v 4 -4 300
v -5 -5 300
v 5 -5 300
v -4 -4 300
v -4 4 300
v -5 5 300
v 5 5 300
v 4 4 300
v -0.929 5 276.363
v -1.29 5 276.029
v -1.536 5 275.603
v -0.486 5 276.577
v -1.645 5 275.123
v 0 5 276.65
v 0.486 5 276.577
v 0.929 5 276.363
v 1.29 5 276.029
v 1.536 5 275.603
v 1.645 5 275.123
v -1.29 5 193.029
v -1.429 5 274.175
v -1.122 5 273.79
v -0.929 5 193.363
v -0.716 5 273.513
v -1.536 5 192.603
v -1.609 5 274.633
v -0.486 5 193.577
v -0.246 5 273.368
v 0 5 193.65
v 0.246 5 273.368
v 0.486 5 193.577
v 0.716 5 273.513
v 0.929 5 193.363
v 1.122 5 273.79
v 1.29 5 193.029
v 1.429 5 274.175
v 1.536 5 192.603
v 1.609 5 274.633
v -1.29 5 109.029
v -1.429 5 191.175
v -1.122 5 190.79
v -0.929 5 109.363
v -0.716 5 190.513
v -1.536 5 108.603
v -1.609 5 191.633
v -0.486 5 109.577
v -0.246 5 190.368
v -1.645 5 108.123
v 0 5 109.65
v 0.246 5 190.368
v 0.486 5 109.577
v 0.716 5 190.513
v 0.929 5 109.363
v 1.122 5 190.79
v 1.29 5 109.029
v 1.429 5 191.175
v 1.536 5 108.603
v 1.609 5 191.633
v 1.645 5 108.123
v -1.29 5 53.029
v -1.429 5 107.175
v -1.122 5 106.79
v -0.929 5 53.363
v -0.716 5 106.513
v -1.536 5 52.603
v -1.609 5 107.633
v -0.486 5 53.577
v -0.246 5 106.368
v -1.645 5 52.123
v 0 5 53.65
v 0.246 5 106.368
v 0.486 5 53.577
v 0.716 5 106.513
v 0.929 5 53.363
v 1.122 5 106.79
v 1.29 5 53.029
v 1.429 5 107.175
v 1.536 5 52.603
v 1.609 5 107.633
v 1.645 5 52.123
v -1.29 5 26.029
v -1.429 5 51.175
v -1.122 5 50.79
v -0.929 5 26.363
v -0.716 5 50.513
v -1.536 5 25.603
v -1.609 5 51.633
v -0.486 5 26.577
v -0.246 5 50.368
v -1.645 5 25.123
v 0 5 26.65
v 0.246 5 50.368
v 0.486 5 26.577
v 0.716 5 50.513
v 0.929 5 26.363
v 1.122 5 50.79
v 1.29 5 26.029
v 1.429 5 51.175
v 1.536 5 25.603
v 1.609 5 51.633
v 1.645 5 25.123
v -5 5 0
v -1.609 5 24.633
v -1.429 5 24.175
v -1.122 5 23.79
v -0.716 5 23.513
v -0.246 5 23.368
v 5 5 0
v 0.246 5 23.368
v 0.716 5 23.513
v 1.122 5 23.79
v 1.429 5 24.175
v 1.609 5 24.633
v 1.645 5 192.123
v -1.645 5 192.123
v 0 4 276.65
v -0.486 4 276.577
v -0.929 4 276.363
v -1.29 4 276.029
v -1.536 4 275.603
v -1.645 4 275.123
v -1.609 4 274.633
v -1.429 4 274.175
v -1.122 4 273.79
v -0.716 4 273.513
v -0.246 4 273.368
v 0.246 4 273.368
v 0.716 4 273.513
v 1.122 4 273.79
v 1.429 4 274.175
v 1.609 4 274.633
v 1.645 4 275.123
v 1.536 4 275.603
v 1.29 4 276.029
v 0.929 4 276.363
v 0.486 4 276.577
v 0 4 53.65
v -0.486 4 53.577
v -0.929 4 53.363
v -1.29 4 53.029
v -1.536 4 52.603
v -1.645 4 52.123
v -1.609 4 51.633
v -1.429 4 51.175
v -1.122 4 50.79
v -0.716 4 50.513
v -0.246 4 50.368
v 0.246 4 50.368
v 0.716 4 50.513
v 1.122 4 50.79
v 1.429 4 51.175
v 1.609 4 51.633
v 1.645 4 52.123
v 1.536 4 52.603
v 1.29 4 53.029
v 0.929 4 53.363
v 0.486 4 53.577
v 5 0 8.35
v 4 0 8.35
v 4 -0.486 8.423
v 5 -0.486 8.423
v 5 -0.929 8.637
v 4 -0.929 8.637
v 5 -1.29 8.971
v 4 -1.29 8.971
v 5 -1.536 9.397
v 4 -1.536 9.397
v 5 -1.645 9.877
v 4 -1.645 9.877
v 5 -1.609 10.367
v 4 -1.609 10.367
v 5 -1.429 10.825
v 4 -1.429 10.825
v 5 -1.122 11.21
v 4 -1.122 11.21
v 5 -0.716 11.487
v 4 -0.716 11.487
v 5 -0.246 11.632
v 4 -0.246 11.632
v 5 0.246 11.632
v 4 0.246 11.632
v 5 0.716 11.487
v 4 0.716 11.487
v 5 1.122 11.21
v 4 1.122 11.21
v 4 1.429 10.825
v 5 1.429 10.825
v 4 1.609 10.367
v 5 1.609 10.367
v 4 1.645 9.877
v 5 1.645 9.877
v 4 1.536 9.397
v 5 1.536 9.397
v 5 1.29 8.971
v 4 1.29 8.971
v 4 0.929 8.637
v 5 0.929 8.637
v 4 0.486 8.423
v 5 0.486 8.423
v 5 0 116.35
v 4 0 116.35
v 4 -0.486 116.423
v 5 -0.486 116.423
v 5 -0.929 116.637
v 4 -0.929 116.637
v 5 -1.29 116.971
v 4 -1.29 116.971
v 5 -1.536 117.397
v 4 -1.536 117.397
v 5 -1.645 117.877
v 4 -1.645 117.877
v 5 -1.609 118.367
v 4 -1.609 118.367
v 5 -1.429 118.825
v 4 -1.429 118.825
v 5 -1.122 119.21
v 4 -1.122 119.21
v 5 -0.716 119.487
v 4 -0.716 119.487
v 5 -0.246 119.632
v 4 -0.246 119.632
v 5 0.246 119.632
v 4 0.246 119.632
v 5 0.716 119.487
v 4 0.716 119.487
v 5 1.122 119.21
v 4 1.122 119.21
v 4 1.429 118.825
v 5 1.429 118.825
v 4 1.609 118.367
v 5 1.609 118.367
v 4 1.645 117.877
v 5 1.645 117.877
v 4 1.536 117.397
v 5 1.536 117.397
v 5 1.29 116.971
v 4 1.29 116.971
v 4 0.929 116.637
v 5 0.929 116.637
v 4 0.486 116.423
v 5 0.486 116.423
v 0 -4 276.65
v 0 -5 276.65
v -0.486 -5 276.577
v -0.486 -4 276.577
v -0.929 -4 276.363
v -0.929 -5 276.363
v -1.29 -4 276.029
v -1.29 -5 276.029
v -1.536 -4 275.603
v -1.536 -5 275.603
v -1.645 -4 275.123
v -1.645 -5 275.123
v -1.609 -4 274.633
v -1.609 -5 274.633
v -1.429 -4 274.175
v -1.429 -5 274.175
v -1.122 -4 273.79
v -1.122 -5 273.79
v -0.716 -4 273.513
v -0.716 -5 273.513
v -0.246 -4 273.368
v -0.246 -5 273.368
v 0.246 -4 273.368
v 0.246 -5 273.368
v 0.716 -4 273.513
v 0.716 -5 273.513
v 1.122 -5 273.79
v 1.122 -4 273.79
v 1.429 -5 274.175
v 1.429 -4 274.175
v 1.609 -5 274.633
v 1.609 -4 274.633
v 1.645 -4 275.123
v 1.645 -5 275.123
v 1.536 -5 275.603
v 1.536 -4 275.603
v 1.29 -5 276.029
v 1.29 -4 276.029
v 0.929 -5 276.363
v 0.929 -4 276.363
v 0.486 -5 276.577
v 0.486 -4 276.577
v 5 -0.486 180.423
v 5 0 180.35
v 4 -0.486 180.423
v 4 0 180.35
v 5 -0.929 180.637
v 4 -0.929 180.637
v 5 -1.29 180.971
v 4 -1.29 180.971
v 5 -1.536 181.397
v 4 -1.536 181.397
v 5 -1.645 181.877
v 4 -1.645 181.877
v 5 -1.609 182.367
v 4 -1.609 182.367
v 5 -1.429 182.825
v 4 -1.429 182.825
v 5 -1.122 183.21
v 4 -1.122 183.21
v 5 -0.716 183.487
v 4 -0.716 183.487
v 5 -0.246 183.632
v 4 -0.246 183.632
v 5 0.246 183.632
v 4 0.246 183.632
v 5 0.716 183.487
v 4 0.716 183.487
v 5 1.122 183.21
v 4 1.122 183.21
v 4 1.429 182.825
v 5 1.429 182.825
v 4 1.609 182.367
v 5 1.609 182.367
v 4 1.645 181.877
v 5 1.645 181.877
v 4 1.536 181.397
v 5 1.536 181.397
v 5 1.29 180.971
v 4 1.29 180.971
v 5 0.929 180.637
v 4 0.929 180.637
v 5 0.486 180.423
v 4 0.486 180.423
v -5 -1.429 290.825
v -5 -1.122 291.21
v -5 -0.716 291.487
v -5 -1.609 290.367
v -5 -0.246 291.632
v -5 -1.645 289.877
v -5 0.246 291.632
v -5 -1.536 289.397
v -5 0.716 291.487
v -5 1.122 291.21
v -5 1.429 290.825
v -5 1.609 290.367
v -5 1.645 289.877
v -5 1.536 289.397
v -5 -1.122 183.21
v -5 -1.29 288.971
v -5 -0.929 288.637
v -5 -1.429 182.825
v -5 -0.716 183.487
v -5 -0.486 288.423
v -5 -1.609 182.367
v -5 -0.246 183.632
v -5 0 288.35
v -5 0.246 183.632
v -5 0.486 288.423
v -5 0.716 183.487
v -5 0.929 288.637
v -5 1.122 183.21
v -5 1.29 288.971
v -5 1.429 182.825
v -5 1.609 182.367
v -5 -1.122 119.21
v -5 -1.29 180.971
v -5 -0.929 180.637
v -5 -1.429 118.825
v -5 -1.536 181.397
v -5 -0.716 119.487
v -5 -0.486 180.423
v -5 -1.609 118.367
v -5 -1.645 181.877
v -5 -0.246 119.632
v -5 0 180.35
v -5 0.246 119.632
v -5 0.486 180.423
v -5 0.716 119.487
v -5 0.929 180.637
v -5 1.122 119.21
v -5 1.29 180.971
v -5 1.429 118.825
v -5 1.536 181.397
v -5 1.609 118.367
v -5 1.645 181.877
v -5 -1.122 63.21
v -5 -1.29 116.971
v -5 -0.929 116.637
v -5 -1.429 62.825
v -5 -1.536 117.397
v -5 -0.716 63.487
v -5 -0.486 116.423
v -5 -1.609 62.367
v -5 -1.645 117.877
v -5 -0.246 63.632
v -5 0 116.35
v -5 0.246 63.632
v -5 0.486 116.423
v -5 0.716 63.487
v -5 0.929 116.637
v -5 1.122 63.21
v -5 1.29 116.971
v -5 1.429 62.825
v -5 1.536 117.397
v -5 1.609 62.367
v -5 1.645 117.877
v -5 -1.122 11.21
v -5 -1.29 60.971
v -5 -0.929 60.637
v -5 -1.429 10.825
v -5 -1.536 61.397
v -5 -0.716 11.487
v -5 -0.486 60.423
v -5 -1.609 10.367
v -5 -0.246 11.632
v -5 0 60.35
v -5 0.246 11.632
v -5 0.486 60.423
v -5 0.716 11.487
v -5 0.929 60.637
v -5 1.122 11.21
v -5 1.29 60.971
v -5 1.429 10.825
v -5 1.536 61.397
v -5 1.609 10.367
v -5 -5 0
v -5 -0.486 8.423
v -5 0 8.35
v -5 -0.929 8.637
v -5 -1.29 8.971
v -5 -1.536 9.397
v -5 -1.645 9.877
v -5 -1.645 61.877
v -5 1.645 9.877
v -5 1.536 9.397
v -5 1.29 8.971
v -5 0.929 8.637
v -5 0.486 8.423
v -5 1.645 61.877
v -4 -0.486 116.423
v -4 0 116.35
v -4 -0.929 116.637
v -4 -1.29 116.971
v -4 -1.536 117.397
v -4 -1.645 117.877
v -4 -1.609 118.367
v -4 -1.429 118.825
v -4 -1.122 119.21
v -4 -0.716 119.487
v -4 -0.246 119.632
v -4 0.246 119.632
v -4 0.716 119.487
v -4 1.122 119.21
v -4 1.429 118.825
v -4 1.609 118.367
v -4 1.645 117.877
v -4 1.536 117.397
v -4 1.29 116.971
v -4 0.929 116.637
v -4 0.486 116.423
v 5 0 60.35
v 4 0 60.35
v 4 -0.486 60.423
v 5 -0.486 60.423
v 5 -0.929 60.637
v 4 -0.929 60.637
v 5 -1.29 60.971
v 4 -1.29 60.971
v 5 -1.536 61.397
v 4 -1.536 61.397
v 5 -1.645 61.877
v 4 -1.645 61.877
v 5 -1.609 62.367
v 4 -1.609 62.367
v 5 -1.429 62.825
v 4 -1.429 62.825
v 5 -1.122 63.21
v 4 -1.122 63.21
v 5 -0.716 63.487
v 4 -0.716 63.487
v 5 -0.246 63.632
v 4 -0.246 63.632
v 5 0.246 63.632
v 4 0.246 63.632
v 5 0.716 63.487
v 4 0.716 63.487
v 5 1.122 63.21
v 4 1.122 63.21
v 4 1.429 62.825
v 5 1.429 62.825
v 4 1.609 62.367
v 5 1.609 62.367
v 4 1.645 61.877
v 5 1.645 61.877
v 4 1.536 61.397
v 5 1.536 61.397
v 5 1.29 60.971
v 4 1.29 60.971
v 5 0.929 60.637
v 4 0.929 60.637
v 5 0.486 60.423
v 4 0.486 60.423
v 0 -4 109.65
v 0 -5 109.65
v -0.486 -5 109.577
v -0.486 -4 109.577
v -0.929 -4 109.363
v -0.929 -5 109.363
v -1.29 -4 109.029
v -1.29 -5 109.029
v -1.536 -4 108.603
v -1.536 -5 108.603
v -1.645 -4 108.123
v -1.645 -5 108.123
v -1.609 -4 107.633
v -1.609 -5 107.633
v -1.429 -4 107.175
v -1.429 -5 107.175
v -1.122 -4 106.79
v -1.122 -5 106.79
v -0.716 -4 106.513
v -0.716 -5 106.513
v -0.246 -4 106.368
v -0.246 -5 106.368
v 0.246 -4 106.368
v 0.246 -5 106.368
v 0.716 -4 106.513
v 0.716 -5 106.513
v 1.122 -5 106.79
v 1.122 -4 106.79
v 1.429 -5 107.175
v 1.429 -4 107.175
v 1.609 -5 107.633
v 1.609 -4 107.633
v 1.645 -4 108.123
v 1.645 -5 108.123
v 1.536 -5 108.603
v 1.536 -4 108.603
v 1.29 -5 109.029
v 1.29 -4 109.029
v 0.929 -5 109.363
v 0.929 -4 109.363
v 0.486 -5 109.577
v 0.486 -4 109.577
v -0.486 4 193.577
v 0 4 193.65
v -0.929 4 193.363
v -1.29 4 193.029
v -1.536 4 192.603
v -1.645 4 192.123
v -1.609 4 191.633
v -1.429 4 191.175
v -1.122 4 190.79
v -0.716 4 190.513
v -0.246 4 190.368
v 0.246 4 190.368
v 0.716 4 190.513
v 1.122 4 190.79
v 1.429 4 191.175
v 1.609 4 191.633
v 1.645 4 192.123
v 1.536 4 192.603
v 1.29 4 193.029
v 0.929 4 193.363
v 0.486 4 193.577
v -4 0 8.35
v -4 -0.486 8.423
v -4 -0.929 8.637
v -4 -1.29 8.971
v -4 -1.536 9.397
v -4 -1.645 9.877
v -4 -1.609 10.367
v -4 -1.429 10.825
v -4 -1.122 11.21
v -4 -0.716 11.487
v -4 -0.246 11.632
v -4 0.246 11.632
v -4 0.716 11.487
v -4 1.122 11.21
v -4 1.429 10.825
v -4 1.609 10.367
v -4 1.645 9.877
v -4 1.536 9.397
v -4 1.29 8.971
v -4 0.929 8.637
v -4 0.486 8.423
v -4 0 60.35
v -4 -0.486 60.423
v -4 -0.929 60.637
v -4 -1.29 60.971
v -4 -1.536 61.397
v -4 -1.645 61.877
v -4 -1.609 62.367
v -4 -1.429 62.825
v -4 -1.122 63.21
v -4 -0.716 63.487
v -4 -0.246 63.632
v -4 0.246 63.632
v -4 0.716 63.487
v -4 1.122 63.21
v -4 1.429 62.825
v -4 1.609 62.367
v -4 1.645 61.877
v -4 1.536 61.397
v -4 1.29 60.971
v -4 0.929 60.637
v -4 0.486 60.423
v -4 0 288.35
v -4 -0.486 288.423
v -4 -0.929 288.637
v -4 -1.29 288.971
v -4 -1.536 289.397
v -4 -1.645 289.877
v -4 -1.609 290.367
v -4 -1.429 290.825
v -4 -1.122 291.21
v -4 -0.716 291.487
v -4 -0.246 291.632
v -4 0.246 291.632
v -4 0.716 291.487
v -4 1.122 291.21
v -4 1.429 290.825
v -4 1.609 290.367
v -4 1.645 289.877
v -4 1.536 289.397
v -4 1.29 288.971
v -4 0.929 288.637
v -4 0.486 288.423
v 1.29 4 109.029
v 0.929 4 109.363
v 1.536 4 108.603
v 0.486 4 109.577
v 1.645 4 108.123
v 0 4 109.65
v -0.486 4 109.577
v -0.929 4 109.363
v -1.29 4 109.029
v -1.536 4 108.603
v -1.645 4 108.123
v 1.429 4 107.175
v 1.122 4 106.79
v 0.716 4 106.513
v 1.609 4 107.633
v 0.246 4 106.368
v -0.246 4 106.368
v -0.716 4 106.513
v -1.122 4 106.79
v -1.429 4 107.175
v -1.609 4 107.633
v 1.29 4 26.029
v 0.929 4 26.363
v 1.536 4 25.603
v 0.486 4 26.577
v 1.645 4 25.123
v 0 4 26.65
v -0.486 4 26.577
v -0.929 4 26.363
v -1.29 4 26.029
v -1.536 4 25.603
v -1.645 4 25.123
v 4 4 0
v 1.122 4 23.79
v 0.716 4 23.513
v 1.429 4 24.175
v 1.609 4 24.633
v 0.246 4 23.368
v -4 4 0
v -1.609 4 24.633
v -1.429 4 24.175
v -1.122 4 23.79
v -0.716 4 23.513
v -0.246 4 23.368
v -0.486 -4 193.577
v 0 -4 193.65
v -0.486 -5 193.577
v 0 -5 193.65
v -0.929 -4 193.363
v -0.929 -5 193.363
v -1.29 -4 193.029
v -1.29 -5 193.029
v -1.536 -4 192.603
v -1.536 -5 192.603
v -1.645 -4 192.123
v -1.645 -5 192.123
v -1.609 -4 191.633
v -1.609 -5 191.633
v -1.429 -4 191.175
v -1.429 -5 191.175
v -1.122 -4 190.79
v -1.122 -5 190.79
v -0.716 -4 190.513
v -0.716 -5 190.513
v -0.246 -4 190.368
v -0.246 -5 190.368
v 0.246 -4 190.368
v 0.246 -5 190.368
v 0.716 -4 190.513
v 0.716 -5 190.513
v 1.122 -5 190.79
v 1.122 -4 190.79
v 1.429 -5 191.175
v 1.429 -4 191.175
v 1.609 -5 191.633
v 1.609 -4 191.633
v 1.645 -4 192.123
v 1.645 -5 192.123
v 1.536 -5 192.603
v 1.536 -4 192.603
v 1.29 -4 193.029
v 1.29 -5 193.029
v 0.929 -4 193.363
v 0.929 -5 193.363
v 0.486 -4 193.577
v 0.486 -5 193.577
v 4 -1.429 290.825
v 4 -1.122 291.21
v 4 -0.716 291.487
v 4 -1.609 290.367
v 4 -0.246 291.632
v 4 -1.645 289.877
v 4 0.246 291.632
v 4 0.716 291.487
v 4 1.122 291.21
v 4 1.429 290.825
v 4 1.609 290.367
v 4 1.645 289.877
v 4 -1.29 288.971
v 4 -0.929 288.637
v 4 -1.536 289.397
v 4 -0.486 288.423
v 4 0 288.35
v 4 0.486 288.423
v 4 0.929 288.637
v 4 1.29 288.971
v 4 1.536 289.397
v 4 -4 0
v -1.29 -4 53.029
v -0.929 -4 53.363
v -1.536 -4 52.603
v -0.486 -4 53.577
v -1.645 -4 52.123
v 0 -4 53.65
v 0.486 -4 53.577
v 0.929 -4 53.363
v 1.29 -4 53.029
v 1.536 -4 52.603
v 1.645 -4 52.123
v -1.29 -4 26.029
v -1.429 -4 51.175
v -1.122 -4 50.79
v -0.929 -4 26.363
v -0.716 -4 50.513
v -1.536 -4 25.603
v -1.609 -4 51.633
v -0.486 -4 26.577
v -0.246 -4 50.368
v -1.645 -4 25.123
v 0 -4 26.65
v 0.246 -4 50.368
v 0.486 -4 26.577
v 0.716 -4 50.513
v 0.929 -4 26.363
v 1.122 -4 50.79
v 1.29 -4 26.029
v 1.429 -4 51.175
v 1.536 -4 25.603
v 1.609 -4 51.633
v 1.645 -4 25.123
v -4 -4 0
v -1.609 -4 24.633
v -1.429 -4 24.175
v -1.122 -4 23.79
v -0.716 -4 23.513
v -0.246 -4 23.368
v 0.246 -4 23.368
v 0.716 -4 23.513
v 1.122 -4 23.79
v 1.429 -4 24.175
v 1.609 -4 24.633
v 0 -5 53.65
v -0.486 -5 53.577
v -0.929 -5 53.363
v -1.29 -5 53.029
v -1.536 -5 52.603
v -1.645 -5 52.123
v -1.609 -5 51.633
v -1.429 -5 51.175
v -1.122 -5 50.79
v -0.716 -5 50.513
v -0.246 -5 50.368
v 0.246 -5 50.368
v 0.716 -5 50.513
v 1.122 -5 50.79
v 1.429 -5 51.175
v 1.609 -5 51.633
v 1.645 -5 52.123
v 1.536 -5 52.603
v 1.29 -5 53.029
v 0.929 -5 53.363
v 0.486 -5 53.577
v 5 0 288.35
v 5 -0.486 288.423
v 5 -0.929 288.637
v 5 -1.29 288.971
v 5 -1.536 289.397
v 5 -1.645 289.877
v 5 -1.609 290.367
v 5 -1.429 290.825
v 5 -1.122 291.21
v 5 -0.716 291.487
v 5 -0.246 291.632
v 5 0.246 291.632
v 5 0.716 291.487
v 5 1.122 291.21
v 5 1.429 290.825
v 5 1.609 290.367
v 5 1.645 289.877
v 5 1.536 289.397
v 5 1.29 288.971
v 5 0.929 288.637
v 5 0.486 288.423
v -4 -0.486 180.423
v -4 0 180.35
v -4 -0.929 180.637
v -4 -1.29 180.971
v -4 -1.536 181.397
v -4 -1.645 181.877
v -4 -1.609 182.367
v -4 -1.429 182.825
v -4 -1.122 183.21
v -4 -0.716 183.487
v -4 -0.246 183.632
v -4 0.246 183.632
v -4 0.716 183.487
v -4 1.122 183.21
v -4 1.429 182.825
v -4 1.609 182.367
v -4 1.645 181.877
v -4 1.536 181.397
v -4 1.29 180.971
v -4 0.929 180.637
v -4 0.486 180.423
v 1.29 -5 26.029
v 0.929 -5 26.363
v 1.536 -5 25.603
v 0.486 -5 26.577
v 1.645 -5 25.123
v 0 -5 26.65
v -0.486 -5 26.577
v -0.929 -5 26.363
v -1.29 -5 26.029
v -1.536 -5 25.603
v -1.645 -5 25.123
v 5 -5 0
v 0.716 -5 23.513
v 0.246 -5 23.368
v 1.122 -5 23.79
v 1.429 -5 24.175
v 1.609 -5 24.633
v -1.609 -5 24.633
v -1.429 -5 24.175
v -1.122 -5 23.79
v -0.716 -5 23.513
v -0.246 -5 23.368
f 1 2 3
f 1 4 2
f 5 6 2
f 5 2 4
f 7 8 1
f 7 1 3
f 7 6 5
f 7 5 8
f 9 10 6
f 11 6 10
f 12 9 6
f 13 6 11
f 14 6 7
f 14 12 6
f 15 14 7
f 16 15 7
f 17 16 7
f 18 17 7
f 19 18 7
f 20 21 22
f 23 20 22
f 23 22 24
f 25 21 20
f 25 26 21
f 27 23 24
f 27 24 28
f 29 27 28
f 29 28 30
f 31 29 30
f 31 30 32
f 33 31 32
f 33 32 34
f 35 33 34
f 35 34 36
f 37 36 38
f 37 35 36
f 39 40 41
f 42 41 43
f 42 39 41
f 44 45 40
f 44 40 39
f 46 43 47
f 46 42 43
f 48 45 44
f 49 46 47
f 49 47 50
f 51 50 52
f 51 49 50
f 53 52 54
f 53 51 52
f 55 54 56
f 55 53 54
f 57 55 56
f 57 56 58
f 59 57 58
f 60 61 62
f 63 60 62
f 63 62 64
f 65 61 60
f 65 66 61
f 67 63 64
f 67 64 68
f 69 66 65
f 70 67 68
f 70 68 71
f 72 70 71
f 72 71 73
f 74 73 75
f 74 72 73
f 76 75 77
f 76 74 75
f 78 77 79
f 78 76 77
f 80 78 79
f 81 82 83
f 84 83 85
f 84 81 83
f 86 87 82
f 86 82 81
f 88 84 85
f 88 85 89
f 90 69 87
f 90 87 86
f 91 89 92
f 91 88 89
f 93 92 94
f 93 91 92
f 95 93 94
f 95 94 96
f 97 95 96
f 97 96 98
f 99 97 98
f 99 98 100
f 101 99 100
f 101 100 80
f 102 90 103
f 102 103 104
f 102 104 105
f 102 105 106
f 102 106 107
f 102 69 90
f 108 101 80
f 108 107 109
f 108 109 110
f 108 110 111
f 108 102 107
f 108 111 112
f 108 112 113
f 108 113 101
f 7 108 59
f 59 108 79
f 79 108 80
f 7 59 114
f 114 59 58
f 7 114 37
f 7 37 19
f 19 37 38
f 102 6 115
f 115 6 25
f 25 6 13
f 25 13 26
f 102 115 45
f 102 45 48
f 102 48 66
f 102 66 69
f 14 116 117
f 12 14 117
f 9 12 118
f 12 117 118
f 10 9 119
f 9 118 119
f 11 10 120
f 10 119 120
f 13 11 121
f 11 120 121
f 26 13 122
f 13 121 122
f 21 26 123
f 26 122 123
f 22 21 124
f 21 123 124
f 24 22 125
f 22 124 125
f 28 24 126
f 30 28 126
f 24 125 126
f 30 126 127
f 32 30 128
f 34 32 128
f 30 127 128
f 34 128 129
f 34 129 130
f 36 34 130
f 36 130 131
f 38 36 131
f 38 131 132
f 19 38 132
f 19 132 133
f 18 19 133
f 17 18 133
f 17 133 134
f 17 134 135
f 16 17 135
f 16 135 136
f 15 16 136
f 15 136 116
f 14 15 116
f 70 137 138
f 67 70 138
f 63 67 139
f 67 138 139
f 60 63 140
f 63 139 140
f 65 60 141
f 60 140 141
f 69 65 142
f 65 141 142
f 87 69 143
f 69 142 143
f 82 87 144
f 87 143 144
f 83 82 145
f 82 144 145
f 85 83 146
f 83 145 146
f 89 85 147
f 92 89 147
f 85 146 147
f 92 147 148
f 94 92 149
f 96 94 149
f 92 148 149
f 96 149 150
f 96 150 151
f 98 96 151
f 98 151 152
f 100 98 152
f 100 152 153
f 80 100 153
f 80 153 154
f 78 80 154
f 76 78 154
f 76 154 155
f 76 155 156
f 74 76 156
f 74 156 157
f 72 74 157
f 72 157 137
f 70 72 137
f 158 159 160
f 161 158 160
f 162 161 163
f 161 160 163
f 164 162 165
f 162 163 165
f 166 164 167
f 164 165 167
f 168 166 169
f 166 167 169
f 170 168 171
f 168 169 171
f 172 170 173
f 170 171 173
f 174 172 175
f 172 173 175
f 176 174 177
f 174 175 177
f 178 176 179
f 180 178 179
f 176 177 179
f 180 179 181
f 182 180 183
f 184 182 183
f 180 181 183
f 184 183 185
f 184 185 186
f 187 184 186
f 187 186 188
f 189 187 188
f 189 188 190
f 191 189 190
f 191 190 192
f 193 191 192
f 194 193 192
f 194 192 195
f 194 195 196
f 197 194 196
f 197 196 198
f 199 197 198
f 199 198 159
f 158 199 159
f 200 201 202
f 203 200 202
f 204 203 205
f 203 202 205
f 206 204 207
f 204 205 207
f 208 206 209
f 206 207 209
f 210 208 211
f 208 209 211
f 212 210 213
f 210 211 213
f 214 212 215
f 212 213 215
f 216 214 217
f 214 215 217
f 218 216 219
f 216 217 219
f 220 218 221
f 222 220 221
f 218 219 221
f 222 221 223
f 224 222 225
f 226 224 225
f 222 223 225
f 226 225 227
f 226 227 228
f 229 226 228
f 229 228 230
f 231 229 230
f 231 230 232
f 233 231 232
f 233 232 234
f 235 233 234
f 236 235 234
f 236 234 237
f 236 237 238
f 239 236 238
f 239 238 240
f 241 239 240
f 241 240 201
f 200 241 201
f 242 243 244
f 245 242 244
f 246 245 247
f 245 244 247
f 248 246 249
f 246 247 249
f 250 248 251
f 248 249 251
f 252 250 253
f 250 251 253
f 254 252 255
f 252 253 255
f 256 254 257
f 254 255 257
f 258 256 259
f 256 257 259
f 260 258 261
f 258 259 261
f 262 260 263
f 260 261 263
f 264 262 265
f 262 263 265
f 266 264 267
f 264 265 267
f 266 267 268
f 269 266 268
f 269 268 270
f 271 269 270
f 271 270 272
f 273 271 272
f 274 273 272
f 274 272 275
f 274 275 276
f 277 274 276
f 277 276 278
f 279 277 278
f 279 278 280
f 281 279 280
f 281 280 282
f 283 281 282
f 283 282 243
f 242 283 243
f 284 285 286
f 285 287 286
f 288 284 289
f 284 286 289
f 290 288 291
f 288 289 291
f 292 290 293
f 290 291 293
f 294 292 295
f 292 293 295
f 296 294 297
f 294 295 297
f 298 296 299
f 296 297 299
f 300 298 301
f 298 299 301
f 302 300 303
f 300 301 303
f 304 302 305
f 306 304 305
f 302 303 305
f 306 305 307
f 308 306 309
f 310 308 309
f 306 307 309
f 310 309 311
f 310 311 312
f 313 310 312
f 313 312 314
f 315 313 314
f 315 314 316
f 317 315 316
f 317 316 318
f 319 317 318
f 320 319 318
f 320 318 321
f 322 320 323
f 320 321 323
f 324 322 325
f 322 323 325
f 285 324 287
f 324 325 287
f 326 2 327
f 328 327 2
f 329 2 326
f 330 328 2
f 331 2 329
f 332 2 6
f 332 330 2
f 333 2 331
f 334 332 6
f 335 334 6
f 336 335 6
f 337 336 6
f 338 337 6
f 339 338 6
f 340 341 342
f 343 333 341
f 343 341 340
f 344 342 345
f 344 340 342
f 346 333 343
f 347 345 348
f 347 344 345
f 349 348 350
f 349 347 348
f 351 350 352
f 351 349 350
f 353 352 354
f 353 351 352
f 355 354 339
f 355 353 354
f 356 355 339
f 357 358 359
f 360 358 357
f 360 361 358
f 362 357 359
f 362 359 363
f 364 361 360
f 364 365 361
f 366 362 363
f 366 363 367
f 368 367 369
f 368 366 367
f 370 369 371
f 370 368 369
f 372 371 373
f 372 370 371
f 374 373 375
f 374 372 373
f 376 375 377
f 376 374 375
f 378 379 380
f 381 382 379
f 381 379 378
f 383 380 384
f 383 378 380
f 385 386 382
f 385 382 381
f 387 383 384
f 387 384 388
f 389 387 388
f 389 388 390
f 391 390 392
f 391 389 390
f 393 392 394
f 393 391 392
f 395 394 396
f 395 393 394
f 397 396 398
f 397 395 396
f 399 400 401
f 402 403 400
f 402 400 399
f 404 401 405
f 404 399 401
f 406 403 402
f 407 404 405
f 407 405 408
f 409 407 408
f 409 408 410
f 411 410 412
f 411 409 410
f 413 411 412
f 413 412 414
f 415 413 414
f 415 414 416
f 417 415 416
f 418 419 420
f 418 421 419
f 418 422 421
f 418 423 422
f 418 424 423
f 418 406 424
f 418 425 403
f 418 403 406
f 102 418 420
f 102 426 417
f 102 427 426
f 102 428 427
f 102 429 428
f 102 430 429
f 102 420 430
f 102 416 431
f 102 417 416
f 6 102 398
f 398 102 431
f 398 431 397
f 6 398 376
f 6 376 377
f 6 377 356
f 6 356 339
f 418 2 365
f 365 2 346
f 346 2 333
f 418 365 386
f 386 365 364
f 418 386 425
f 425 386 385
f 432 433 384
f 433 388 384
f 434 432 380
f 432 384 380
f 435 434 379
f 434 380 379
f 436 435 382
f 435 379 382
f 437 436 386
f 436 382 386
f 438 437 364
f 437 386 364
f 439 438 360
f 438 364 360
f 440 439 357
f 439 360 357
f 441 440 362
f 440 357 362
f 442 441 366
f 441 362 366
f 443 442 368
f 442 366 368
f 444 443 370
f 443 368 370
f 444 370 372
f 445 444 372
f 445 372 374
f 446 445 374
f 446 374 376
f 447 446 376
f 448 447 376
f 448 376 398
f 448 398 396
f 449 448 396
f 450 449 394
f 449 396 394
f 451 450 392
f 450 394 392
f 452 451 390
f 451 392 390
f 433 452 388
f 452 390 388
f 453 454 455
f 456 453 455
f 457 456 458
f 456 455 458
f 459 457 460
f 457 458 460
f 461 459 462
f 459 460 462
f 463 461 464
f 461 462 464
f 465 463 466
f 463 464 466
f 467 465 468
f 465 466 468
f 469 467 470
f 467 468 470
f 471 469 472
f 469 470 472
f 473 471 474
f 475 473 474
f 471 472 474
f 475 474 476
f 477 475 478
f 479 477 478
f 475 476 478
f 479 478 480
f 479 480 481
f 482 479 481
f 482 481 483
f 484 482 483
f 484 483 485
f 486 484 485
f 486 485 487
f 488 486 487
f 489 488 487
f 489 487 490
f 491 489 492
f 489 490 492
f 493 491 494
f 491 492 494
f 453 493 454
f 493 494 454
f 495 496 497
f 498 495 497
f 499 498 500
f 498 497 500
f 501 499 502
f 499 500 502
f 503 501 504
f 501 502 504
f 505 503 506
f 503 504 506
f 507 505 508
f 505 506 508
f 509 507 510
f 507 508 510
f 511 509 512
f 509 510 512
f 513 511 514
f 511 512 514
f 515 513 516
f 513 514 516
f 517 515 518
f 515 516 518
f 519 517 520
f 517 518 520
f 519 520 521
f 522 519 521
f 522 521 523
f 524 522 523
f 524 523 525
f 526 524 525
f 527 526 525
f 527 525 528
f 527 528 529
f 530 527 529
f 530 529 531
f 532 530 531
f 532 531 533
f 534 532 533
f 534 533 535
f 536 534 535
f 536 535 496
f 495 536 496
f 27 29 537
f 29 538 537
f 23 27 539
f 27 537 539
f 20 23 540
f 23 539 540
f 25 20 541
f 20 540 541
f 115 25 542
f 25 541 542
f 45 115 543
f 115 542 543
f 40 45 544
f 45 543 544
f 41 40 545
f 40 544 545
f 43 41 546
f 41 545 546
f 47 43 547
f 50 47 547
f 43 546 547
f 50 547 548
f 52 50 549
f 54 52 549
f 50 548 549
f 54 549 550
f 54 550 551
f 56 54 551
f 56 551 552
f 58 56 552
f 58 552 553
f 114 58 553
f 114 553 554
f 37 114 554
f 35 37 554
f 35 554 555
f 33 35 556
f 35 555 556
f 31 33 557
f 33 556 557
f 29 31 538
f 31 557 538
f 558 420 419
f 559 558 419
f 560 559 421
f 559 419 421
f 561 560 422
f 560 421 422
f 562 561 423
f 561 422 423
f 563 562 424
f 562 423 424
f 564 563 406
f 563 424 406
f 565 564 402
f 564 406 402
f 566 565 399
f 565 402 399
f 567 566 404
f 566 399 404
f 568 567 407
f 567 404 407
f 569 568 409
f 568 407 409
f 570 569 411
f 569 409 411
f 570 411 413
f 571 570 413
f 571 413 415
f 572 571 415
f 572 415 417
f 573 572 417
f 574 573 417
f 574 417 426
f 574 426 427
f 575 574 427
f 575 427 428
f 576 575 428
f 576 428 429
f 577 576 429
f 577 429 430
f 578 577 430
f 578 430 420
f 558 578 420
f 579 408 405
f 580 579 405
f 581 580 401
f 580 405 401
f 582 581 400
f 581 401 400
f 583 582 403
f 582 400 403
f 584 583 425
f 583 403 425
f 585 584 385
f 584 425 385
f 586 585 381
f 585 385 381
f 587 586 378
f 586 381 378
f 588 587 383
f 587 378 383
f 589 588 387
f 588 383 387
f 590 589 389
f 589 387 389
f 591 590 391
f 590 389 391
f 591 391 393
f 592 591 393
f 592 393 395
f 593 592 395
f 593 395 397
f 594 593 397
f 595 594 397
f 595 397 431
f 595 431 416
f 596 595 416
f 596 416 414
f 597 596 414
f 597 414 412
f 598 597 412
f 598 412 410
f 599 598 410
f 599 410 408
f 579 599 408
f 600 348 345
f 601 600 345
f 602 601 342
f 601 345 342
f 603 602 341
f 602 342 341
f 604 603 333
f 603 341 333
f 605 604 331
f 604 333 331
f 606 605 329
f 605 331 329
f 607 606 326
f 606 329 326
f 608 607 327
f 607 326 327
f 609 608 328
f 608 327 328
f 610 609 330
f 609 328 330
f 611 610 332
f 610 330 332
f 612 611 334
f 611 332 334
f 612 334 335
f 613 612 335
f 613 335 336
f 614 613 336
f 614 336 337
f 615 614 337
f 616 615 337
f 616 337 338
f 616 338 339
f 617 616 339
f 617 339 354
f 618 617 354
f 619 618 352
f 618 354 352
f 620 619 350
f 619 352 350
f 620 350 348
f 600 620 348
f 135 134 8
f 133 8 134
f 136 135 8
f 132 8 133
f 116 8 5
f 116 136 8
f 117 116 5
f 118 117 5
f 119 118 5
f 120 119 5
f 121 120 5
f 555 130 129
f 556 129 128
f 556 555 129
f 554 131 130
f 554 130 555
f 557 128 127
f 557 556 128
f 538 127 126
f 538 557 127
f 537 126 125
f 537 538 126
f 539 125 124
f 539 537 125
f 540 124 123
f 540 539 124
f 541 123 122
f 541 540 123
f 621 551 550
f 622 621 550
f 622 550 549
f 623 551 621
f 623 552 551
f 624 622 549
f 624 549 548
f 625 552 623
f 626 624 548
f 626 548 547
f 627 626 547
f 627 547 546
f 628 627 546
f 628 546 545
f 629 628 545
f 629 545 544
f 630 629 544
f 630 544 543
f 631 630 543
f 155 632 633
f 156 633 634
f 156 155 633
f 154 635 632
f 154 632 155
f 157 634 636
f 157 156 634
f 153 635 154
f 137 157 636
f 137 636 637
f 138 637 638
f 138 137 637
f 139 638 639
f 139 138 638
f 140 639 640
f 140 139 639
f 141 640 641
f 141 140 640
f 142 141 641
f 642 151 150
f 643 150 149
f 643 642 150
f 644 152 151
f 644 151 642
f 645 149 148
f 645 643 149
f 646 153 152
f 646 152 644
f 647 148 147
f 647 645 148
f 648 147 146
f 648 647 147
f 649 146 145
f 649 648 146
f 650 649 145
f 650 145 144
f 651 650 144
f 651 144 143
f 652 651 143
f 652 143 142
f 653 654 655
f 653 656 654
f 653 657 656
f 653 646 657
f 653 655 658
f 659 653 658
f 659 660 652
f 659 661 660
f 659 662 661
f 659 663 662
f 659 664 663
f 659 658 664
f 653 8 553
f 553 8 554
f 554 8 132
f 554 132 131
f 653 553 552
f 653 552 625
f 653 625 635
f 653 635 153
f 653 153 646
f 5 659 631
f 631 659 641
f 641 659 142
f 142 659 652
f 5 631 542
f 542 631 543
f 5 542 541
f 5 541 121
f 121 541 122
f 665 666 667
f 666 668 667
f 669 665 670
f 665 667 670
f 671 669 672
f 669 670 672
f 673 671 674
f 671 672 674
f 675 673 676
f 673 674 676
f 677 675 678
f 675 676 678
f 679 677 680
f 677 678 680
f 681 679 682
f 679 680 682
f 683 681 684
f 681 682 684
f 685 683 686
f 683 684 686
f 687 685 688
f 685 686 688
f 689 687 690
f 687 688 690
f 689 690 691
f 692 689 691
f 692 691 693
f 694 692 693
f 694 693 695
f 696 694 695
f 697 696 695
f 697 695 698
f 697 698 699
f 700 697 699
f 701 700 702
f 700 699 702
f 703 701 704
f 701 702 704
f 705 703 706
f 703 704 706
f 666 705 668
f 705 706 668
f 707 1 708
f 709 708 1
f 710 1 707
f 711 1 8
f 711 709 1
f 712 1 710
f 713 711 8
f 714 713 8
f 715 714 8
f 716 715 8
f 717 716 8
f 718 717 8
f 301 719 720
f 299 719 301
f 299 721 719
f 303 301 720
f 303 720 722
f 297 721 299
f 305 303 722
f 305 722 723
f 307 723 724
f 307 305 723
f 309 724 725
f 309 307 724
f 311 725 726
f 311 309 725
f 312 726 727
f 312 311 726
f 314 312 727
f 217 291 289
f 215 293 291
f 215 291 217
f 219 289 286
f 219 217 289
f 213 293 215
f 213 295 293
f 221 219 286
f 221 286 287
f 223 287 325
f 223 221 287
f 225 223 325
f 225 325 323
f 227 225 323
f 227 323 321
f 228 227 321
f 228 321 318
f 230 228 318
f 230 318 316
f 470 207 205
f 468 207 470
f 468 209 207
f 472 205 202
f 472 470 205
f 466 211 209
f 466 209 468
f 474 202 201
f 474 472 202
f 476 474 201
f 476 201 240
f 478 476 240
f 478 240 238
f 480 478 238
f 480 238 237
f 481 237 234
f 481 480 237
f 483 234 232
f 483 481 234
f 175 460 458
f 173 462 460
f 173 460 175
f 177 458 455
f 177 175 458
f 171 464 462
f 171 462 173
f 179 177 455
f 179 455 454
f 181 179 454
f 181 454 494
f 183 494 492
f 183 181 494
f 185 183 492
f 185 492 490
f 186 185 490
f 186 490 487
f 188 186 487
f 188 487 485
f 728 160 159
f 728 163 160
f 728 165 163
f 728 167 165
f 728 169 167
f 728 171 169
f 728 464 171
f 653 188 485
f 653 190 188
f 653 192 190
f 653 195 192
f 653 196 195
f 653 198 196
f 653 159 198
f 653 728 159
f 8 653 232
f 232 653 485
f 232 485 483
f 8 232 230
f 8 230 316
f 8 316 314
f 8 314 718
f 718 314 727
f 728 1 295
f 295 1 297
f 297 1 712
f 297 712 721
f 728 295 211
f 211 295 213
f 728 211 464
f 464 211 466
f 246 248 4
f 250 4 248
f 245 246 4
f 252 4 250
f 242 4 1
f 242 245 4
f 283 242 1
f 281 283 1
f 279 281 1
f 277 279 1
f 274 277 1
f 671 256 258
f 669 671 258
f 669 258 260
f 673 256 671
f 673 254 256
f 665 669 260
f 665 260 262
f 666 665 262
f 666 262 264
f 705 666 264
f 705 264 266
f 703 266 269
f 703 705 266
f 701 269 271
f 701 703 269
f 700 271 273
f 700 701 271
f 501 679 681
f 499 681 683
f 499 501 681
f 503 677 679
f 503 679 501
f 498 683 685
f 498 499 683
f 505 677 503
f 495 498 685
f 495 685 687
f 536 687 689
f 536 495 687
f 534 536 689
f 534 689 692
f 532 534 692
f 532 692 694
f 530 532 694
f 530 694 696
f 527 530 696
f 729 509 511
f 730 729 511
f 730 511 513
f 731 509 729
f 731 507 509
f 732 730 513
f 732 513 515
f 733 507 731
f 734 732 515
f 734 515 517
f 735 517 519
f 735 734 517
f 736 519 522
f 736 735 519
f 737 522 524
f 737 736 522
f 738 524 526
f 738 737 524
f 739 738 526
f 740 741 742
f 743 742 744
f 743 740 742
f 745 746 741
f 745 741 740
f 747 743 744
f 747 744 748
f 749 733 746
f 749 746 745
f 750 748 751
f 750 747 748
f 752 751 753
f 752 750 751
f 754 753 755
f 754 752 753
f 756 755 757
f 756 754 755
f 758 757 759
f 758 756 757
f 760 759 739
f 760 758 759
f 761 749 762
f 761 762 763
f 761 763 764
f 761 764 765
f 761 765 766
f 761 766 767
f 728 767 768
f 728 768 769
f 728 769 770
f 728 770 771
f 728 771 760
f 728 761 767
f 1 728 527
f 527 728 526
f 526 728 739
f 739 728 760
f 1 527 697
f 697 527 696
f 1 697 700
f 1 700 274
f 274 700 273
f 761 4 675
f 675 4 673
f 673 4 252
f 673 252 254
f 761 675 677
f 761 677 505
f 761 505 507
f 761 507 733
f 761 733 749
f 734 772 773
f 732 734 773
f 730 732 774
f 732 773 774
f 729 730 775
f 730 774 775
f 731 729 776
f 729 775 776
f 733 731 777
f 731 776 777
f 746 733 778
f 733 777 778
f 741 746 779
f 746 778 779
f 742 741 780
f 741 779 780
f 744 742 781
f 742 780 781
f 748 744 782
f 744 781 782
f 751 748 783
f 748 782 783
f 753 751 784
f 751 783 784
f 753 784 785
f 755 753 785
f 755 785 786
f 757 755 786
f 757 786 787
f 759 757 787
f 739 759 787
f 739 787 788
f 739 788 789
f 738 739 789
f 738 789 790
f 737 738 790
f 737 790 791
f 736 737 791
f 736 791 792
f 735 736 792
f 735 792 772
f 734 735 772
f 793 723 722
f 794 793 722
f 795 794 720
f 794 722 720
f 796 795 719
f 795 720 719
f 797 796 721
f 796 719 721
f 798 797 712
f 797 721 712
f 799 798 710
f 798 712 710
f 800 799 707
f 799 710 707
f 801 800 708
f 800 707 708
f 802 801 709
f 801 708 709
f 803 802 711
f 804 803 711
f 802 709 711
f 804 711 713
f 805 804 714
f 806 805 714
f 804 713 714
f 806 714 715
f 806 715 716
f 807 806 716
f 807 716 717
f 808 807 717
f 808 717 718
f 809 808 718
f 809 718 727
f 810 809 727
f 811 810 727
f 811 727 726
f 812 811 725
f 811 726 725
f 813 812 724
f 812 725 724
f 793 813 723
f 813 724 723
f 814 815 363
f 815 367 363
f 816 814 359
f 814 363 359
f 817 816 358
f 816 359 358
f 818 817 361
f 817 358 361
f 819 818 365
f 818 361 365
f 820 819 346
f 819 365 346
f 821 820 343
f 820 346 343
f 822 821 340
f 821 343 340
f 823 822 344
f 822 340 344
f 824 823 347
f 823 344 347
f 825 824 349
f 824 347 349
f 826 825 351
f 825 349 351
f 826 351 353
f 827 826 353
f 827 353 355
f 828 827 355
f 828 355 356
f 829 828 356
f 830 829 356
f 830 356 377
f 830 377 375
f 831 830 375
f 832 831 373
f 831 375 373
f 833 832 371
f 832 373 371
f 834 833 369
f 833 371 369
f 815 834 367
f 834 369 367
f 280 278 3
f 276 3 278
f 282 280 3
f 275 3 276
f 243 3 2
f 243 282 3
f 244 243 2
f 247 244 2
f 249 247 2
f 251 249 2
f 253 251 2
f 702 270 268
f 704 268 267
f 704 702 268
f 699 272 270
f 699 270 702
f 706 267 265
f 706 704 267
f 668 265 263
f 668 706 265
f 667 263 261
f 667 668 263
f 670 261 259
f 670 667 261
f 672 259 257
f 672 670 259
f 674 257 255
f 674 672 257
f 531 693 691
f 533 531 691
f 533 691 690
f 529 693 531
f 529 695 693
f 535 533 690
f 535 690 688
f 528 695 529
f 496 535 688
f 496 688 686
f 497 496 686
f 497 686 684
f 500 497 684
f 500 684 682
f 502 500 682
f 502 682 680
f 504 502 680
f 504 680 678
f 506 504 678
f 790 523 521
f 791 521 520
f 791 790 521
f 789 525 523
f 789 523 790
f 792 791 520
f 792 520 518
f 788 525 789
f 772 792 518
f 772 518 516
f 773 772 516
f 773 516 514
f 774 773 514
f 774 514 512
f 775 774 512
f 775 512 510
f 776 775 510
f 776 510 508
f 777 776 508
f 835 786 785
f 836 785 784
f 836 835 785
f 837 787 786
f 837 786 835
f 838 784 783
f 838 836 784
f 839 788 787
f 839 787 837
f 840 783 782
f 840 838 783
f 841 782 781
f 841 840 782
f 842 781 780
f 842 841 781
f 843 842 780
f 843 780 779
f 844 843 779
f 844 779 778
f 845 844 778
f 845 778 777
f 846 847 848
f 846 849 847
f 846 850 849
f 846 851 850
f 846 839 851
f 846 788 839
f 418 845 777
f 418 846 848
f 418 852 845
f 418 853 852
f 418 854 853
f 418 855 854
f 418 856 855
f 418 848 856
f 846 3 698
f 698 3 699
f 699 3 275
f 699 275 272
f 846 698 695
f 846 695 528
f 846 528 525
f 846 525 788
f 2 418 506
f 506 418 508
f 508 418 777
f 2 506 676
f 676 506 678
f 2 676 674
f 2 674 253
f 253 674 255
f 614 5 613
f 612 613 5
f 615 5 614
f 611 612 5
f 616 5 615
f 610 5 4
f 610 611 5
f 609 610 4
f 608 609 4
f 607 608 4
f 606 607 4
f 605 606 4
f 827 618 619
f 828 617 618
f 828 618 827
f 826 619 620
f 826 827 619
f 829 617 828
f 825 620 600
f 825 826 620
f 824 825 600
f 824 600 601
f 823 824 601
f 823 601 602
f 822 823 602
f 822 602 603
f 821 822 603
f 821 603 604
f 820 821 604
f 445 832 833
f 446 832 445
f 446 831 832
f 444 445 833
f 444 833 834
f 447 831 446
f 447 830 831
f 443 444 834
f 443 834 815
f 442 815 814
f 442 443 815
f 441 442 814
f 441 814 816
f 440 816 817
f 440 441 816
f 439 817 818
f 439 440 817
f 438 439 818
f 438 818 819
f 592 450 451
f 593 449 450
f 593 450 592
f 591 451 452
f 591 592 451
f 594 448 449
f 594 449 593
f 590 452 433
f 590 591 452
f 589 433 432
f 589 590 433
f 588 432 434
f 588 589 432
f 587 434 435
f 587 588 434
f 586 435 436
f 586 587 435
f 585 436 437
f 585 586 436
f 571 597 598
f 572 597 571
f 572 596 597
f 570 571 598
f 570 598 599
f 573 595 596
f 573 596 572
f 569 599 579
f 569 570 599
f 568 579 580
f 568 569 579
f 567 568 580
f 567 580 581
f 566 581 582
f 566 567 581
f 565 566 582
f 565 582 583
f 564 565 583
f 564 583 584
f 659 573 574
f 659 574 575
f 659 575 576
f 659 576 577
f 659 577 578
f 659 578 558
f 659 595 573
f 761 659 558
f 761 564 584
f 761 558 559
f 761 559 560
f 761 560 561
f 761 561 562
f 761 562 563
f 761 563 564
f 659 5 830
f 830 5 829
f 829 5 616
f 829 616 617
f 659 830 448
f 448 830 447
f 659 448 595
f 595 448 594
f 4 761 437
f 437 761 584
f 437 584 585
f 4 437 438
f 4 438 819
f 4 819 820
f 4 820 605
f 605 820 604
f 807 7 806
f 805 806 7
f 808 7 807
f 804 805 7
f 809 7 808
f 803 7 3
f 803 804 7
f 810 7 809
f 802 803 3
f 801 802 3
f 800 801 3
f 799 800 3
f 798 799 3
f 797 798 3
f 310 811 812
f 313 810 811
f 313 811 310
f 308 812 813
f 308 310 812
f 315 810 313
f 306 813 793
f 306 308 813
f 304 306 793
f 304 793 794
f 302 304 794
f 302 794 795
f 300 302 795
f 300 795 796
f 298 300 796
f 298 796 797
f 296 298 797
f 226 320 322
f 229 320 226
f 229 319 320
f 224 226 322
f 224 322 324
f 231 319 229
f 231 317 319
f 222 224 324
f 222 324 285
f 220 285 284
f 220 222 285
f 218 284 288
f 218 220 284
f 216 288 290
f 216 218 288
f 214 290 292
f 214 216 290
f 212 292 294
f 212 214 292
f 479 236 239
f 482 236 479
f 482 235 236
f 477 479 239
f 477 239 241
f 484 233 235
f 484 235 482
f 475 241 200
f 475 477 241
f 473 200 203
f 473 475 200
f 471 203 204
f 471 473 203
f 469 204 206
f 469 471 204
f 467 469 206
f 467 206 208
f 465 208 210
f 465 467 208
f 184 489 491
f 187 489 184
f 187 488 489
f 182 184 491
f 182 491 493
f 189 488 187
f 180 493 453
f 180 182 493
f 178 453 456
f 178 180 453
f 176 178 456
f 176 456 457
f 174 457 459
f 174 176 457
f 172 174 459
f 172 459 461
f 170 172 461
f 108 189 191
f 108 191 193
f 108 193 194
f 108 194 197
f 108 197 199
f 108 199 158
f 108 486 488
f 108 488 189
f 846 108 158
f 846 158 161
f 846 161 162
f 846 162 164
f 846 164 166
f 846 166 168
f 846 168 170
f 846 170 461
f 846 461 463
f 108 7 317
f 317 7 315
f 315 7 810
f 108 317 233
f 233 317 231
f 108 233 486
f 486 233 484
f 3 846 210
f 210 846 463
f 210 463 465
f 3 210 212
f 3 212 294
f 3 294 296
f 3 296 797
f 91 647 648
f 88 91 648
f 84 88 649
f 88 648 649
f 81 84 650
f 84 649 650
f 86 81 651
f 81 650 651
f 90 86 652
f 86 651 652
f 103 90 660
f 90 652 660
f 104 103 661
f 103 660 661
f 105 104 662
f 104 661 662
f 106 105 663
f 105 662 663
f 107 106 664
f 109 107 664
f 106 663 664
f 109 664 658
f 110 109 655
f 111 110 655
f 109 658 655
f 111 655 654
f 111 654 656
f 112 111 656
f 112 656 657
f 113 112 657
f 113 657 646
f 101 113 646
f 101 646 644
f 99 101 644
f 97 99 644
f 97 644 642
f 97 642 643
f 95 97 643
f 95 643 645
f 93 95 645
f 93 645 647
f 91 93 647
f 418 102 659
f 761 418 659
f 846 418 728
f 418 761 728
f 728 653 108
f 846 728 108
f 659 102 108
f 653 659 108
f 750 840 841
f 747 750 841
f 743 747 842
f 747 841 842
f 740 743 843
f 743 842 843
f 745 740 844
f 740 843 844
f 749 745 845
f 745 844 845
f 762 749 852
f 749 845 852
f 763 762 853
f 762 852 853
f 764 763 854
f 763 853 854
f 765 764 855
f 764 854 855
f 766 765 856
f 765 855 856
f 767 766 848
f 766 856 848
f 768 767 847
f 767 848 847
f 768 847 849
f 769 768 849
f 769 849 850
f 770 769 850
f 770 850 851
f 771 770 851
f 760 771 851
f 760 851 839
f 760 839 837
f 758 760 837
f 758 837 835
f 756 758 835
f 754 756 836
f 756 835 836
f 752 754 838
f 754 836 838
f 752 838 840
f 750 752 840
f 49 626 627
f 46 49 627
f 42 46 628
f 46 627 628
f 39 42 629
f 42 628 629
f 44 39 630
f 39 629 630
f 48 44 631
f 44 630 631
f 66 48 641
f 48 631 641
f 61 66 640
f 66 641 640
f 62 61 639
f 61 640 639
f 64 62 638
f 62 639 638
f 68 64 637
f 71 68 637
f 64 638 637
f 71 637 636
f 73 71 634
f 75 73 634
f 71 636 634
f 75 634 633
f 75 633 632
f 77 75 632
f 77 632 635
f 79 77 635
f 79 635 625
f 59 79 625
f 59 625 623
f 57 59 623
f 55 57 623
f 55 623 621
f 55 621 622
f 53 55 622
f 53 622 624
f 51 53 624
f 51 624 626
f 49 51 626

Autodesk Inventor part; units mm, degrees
ref_plane "YZ Plane" through (0, 0, 0) normal (1, 0, 0) x (0, 1, 0)
ref_plane "XZ Plane" through (0, 0, 0) normal (0, 1, 0) x (-1, 0, 0)
ref_plane "XY Plane" through (0, 0, 0) normal (0, 0, 1) x (1, 0, 0)
sketch "スケッチ1" plane through (0, 0, 0) normal (0, 0, 1) x (1, 0, 0)
  line L0 (5, -5) -> (-5, -5)
  line L1 (-5, -5) -> (-5, 5)
  line L2 (-5, 5) -> (5, 5)
  line L3 (5, 5) -> (5, -5)
  line L4 (5, -5) -> (-5, 5) construction
  line L5 (-5, -5) -> (5, 5) construction
  line L6 (4, 4) -> (-4, 4)
  line L7 (-4, 4) -> (-4, -4)
  line L8 (-4, -4) -> (4, -4)
  line L9 (4, -4) -> (4, 4)
  point P0 (0, 0)
  dimension "d0" = 10
  dimension "d1" = 10
  dimension "d2" = 1
extrude "押し出し1" add sketch "スケッチ1" along normal blind 300
sketch "スケッチ2" plane through (5, -5, 0) normal (1, 0, 0) x (0, 0, -1)
  line L0 (0, 0) -> (0, 10) projected
  line L1 (0, 10) -> (-300, 10) projected
  line L2 (-300, 0) -> (-300, 10) projected
  line L3 (0, 0) -> (-300, 0) projected
  line L4 (0, 5) -> (-300, 5)
  line L5 (-300, 0) -> (-300, 10) projected
  point P0 (-290, 5)
  point P1 (-182, 5)
  point P2 (-62, 5)
  point P3 (-10, 5)
  point P4 (-118, 5)
  dimension "d7" = 120
  dimension "d25" = 10
  dimension "d26" = 52
  dimension "d27" = 10
  dimension "d28" = 108
  dimension "d29" = 56
hole "穴1" at (5, 0, 290) at (5, 0, 182) at (5, 0, 62) at (5, 0, 10) at (5, 0, 118) direction (-1, 0, 0) diameter 3.3 end through all
sketch "スケッチ3" plane through (-5, 5, 0) normal (0, 1, 0) x (1, 0, 0)
  line L0 (10, 0) -> (0, 0) projected
  line L1 (0, 0) -> (0, -300) projected
  line L2 (10, -300) -> (0, -300) projected
  line L3 (10, 0) -> (10, -300) projected
  line L4 (5, -300) -> (5, 0)
  point P0 (5, -275)
  point P1 (5, -52)
  point P2 (5, -108)
  point P3 (5, -192)
  point P4 (5, -25)
  dimension "d17" = 25
  dimension "d30" = 52
  dimension "d31" = 56
  dimension "d32" = 84
  dimension "d33" = 25
hole "穴2" at (0, 5, 275) at (0, 5, 52) at (0, 5, 108) at (0, 5, 192) at (0, 5, 25) direction (0, -1, 0) diameter 3.3 end through all
properties part number "kaku_1010_200"
